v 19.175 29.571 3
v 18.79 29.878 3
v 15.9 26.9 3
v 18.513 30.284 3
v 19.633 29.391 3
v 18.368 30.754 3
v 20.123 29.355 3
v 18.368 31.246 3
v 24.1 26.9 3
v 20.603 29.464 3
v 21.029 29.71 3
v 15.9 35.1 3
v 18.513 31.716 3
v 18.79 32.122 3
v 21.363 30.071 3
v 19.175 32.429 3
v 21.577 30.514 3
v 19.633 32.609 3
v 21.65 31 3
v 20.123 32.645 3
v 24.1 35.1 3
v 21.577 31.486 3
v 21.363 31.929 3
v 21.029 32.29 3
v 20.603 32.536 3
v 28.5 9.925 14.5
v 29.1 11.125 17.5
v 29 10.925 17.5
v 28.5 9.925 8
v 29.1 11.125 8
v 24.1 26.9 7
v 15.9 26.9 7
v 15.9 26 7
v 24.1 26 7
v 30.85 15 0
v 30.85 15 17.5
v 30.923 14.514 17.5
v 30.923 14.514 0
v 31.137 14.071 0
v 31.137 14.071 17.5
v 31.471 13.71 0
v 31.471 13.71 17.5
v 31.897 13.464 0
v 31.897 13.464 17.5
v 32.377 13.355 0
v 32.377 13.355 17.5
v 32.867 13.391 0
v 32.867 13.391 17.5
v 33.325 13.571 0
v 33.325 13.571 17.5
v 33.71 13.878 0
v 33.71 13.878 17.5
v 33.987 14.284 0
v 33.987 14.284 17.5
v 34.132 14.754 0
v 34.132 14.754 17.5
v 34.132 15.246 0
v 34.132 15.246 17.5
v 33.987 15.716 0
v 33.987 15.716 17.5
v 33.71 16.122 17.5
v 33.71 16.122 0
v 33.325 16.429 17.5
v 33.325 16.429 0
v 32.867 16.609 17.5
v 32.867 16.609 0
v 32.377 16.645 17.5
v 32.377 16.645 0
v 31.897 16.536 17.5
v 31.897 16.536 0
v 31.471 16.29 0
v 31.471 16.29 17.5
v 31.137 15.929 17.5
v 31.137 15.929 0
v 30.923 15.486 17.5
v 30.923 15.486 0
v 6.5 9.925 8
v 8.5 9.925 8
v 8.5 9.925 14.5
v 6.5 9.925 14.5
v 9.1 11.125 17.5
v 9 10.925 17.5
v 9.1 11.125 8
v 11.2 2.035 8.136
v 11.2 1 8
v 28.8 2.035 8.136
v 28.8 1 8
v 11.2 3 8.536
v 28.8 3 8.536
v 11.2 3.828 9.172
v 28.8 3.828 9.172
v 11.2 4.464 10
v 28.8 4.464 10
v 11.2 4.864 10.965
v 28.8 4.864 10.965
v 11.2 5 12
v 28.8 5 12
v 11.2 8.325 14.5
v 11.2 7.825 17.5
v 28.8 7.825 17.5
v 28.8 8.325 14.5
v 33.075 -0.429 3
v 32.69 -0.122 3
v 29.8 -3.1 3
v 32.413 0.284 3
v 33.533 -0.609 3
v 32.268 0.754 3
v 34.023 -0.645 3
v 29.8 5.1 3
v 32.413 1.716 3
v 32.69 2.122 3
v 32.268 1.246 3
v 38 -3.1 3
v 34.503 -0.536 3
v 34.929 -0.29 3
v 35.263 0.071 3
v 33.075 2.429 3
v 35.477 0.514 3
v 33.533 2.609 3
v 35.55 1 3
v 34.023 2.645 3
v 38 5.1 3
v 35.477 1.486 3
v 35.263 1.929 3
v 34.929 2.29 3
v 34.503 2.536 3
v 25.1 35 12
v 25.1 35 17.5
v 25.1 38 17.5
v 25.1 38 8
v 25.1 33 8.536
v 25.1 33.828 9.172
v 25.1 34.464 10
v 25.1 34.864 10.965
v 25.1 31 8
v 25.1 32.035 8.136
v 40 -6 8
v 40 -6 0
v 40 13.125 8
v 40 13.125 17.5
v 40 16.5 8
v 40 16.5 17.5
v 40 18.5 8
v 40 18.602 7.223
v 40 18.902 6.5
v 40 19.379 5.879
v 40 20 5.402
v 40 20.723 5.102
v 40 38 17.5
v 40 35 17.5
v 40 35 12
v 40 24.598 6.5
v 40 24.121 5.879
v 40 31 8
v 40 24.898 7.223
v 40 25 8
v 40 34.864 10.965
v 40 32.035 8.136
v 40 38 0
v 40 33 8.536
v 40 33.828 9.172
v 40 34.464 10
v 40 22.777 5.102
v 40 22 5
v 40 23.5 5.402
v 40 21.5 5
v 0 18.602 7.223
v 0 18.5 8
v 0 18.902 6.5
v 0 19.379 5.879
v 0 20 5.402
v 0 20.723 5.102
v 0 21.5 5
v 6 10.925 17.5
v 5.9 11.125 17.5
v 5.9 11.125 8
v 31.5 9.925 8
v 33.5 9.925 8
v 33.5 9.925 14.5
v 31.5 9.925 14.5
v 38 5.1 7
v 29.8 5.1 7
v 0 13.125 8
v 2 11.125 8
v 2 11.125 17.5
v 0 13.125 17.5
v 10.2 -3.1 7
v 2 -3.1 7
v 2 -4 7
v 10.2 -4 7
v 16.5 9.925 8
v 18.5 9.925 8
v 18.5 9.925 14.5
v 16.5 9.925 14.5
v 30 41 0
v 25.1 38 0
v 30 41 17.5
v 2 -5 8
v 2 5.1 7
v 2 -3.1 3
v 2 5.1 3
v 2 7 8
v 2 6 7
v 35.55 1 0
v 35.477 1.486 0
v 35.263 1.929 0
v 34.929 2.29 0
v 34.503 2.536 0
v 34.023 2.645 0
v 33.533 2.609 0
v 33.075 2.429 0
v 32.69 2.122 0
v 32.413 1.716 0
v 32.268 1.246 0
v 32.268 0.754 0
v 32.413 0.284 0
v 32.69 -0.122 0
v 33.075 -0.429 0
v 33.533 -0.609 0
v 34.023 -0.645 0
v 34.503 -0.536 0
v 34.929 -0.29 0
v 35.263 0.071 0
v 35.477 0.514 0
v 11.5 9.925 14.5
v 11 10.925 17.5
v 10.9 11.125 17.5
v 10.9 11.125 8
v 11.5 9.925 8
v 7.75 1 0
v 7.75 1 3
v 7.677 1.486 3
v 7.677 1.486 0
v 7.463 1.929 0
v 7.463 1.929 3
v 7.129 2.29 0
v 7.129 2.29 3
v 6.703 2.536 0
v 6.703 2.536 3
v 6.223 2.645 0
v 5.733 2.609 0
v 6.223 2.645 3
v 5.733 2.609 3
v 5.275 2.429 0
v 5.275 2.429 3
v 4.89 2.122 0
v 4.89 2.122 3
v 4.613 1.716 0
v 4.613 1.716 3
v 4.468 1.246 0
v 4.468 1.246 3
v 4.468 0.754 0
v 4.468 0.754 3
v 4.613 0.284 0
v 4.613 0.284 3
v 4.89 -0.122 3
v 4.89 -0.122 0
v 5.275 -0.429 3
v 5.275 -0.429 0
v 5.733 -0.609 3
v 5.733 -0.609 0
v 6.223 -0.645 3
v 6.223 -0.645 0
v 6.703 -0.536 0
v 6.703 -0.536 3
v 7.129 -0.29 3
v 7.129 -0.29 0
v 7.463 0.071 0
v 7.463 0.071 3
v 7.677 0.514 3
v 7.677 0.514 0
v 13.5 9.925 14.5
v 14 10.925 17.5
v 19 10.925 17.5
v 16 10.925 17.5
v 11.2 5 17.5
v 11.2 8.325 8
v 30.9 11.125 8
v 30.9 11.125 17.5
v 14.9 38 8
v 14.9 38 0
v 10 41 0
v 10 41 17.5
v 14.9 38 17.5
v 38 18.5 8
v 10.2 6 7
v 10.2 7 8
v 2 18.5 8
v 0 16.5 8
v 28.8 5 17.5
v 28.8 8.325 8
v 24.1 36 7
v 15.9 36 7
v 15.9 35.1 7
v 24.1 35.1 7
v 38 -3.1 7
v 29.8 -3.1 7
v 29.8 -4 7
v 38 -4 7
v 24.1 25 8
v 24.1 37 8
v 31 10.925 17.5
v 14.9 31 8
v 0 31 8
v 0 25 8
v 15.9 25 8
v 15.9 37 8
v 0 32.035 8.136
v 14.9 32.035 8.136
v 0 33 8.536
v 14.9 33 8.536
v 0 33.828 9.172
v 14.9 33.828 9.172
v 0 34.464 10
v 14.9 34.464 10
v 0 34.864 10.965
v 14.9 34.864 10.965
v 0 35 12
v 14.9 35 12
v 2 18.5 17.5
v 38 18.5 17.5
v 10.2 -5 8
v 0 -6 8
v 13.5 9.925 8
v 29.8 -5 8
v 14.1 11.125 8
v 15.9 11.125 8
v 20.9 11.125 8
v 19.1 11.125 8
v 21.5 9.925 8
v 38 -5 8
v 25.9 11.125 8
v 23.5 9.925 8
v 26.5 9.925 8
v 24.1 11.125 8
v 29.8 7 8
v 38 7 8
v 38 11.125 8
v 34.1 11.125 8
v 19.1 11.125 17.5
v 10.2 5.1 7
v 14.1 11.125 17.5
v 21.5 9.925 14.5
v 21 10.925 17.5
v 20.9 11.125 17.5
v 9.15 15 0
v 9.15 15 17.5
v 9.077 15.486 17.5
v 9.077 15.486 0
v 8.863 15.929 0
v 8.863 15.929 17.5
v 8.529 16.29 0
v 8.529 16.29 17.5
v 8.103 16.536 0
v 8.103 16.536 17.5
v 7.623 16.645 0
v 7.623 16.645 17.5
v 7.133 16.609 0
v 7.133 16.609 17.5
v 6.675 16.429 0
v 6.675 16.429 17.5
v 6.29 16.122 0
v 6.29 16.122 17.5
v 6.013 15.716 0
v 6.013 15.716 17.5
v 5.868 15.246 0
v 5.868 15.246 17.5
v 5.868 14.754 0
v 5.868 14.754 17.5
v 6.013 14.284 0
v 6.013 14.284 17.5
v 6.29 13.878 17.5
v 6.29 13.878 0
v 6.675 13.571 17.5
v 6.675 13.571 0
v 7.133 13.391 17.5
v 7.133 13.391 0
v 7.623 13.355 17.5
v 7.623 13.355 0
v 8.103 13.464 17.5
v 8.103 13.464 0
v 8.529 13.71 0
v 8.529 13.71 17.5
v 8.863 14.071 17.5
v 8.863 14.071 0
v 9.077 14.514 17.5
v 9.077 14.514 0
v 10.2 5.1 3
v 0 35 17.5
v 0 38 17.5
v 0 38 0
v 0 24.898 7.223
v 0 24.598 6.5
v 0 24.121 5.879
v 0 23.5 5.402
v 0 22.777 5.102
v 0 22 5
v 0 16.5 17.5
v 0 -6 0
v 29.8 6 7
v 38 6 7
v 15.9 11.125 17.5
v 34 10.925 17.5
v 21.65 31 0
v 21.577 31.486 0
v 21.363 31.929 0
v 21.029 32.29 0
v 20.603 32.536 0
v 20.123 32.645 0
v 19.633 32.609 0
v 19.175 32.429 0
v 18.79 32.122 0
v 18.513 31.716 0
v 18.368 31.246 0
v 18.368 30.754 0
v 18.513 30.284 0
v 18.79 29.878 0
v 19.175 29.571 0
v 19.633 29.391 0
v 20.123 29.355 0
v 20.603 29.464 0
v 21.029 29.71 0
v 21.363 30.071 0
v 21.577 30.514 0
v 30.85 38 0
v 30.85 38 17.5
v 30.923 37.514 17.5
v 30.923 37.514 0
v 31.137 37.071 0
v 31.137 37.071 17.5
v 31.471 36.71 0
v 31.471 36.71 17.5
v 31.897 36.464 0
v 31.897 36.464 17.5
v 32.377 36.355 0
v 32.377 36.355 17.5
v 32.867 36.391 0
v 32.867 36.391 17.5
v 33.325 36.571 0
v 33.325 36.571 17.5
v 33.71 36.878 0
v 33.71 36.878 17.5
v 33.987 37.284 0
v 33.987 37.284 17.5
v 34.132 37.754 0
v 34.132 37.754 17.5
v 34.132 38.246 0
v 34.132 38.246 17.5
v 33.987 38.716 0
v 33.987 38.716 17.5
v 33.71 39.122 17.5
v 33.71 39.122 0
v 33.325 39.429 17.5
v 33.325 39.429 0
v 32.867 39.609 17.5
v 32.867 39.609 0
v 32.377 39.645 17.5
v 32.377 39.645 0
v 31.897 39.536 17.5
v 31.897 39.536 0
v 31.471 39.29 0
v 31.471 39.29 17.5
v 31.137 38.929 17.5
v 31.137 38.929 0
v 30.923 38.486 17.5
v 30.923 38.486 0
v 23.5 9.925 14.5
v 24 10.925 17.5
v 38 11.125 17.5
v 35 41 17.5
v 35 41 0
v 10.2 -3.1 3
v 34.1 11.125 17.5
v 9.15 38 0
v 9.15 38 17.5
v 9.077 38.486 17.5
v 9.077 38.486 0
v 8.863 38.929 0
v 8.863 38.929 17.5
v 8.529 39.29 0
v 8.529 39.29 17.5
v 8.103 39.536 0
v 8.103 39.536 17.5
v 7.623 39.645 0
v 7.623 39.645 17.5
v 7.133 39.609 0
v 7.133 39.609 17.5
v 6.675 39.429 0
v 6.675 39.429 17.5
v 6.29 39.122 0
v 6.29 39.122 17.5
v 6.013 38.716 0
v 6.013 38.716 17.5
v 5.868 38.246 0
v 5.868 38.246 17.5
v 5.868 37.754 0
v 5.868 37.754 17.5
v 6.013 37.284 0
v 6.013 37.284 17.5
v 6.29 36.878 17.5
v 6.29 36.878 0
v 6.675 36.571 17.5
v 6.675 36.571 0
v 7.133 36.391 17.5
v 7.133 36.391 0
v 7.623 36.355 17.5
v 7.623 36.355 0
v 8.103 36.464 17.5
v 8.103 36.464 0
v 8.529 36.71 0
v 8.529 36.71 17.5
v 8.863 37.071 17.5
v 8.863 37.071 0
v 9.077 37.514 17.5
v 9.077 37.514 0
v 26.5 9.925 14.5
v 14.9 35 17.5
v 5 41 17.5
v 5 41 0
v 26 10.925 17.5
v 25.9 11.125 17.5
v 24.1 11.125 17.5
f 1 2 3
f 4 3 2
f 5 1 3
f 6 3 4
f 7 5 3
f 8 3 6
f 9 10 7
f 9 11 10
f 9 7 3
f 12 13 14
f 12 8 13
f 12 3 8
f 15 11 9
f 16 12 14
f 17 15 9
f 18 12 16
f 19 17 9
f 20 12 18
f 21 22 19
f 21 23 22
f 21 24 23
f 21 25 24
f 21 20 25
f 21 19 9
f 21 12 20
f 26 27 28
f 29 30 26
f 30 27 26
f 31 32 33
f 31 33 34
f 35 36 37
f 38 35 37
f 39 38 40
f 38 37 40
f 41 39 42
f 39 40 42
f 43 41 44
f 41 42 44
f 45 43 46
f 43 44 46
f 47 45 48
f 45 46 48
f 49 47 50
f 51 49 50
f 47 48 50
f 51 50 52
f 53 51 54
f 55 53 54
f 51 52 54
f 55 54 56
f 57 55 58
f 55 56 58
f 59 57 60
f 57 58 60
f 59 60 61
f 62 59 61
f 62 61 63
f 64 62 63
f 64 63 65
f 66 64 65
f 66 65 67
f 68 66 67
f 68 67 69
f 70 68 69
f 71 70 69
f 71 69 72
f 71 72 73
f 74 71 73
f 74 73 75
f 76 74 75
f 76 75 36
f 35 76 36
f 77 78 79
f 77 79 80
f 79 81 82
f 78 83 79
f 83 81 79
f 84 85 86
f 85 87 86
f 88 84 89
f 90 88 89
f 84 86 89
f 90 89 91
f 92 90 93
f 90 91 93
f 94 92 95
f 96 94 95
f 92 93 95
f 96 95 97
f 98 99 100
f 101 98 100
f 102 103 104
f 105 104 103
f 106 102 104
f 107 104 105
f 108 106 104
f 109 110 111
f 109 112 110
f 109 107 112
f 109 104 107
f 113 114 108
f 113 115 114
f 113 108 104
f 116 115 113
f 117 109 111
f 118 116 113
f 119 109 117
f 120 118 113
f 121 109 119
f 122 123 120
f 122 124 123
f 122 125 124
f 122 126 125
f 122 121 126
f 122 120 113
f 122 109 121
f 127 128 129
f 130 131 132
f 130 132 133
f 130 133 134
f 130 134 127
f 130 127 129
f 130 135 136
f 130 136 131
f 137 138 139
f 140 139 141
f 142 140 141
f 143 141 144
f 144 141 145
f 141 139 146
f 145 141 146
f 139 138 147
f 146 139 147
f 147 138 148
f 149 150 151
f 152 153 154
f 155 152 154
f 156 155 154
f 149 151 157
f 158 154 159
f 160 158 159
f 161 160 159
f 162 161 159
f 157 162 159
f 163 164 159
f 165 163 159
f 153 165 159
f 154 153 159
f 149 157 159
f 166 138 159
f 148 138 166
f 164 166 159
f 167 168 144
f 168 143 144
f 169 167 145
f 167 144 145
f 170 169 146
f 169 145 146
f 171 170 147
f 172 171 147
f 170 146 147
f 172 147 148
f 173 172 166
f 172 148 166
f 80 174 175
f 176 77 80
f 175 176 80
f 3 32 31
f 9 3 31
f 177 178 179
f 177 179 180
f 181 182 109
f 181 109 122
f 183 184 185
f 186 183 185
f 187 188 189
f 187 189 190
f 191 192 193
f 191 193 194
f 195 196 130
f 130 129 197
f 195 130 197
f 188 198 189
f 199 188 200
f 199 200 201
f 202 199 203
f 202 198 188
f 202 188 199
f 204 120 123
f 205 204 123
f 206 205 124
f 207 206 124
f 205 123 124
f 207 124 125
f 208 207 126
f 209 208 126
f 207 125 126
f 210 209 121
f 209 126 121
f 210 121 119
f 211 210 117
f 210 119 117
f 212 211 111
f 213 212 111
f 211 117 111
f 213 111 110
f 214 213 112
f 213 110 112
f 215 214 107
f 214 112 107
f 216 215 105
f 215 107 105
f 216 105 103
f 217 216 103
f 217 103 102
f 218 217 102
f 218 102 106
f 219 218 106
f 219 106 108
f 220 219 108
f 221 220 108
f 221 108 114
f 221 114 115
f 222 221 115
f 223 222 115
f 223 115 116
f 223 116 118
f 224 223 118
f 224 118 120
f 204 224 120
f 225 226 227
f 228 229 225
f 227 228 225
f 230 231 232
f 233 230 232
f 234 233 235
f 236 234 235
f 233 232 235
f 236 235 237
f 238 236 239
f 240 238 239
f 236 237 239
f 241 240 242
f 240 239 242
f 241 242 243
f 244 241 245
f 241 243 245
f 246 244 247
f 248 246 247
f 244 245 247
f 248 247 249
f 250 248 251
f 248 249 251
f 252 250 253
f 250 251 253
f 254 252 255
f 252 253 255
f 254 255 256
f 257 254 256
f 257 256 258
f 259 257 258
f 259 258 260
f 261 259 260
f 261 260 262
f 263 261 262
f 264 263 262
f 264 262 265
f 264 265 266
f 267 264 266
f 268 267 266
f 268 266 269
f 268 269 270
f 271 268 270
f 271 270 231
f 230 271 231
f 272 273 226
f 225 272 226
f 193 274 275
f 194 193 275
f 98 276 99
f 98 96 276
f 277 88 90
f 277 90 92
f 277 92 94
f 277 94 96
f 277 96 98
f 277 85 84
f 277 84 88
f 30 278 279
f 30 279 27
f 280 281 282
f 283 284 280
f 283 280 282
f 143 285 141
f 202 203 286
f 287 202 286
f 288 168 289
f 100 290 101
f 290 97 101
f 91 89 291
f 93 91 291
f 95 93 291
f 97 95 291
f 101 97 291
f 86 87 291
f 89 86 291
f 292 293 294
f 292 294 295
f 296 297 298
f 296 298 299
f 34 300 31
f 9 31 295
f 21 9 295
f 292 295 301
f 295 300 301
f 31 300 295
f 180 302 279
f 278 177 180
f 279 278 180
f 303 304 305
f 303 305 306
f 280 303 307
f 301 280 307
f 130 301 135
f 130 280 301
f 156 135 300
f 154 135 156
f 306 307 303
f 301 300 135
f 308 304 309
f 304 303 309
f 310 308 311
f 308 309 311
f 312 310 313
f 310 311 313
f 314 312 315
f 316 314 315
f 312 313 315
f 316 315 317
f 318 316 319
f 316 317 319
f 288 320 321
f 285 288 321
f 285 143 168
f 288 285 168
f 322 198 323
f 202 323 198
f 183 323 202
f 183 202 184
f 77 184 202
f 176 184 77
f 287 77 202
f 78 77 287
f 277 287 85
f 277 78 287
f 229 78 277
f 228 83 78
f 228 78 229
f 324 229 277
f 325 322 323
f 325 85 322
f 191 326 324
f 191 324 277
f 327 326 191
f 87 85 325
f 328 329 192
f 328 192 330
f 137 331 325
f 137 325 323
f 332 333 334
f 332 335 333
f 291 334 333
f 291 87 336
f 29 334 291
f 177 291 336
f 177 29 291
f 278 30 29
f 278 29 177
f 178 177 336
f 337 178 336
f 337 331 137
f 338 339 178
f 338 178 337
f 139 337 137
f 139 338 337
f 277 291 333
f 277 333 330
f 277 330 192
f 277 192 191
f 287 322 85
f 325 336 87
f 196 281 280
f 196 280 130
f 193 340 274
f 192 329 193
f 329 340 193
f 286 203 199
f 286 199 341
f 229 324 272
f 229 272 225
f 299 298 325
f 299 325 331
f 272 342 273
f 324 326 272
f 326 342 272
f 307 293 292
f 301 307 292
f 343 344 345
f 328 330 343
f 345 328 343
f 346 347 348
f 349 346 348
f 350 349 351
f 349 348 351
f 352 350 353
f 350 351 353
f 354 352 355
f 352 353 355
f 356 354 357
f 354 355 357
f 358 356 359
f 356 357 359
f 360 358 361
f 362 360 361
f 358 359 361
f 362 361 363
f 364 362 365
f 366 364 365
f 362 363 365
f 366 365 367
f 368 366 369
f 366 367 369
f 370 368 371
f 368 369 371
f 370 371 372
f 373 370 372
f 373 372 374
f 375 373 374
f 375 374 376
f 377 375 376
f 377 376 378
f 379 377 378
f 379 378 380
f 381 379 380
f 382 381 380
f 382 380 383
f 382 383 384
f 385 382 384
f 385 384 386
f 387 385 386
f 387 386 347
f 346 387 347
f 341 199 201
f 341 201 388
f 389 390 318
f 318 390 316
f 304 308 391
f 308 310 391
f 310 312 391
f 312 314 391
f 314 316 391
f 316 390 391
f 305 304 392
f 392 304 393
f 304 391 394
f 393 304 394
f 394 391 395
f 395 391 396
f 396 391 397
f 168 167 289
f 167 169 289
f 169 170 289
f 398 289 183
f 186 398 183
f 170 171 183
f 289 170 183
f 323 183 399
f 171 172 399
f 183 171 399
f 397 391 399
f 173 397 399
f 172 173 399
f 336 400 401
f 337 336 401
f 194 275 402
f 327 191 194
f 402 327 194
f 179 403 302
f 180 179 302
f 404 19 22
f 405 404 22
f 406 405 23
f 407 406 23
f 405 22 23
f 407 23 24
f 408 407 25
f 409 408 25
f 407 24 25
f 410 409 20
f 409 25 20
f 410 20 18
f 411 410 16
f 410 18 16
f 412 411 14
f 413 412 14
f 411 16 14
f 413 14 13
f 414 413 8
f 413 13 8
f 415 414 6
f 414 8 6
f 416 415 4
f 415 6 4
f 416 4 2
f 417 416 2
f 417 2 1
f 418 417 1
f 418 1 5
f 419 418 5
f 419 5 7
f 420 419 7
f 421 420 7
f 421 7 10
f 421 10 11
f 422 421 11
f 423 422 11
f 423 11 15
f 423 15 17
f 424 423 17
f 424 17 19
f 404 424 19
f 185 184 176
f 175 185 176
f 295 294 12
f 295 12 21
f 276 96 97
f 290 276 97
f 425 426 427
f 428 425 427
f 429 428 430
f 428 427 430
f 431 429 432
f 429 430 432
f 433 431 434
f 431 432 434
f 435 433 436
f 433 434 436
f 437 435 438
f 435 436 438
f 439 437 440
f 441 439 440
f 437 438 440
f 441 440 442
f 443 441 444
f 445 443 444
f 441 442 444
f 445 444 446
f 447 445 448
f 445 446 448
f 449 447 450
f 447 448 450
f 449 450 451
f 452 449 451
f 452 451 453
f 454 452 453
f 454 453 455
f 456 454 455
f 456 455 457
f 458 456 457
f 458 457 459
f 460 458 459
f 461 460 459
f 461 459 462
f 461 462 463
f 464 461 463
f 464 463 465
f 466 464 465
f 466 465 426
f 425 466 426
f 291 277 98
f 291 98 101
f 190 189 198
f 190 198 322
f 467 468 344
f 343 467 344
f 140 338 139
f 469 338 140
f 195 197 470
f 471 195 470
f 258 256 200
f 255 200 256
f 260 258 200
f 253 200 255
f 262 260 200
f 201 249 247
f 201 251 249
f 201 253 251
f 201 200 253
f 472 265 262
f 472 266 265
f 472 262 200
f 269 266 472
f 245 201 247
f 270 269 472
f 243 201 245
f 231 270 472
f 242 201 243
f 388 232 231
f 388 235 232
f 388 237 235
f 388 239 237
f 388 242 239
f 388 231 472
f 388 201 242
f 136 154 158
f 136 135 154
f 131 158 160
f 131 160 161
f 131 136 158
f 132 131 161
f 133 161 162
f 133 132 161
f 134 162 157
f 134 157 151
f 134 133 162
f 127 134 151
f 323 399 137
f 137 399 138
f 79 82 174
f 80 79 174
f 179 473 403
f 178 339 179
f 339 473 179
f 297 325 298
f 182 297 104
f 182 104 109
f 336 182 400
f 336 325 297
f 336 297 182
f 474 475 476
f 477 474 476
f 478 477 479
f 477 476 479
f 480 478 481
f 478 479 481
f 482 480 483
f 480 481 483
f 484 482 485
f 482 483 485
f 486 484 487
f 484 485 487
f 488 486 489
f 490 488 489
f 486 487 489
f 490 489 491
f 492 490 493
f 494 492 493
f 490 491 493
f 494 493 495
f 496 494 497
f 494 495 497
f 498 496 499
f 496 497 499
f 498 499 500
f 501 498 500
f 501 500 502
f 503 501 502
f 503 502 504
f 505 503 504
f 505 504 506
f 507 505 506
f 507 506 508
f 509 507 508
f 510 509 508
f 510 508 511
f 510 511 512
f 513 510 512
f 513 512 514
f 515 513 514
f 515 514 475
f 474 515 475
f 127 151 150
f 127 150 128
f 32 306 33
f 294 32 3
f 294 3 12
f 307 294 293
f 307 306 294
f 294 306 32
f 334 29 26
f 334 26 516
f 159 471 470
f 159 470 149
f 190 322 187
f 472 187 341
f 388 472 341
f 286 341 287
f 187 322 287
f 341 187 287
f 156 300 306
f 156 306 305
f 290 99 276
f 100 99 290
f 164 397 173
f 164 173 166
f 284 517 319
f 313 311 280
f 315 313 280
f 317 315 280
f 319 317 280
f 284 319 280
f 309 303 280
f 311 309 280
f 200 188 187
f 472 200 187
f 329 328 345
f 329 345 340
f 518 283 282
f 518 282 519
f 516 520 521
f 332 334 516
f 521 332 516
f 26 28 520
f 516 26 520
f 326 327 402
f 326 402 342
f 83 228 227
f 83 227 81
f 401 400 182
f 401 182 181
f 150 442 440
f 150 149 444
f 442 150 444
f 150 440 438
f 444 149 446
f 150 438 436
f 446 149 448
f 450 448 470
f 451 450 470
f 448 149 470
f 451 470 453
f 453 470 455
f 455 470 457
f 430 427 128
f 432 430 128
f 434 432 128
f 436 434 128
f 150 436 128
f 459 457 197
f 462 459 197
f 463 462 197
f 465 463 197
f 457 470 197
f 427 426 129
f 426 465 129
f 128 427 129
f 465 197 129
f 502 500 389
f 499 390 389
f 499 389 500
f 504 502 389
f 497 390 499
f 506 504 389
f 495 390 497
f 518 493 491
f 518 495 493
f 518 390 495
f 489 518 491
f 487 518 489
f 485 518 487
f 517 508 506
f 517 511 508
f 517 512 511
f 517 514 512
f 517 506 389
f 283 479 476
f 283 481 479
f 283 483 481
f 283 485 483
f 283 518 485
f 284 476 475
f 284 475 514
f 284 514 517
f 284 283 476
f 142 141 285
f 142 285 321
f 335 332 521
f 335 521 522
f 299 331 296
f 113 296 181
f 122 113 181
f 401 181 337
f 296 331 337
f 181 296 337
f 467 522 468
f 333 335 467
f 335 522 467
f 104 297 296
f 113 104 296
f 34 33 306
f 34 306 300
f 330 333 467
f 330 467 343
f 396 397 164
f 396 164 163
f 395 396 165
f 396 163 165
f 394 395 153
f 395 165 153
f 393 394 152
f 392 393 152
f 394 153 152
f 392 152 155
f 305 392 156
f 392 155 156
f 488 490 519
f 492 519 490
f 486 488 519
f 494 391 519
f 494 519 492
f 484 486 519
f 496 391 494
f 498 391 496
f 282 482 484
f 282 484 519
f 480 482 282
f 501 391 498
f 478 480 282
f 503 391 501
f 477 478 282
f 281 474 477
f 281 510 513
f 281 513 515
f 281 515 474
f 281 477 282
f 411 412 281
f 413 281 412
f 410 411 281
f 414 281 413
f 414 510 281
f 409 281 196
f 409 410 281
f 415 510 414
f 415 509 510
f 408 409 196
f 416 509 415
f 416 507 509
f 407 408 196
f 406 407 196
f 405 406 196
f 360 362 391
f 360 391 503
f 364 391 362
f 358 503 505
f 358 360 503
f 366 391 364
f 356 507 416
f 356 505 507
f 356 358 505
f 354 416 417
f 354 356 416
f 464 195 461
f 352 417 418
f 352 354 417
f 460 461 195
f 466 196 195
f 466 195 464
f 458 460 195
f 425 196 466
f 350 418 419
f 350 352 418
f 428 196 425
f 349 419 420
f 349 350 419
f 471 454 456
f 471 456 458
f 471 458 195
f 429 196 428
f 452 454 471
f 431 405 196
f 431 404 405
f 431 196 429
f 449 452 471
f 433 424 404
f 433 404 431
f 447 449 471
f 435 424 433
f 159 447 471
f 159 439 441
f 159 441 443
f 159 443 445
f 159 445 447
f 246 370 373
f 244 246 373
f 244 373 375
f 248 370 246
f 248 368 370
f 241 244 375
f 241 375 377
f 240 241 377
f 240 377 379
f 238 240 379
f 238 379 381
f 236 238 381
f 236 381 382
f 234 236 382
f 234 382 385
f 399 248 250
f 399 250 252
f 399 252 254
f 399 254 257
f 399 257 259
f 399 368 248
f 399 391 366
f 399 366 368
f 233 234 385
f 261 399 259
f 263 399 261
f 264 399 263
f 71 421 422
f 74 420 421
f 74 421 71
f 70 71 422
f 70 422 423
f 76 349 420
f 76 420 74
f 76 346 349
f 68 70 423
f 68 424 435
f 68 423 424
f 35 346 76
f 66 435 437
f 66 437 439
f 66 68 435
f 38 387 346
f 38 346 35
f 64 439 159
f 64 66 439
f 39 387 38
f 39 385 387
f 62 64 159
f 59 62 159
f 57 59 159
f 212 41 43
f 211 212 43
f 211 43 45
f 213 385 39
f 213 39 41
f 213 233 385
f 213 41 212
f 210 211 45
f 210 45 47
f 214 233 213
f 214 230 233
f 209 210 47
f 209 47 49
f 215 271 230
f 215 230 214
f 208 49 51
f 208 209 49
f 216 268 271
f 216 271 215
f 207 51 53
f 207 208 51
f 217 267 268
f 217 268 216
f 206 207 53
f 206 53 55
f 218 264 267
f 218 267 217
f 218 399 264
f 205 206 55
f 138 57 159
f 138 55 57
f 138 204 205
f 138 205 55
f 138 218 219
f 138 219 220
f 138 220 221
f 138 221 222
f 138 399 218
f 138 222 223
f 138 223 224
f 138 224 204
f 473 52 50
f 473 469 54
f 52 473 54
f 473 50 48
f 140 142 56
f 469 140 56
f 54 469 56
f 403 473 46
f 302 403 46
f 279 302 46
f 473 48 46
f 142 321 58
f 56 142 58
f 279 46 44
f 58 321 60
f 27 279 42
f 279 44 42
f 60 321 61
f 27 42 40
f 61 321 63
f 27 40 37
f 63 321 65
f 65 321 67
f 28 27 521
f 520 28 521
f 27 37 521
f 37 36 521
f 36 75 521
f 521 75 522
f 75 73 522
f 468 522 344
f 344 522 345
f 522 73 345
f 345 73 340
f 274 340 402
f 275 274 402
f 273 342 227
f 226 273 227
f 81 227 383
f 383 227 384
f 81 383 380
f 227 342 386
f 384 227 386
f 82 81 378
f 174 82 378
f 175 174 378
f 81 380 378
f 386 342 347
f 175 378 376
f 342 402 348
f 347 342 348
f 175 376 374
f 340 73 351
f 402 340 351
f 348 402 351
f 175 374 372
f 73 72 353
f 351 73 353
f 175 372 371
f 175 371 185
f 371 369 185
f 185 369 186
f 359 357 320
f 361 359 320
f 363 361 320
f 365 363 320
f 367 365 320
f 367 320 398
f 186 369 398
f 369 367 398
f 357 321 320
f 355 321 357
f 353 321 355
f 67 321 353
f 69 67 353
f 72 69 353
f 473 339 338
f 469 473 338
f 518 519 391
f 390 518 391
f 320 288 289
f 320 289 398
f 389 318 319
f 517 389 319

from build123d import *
from OCP.BRepFilletAPI import BRepFilletAPI_MakeChamfer

# Parameters (mm, degrees)
SKETCH1_W                       = 40
SKETCH1_H                       = 44
BOSS_EXTRUDE1_DEPTH             = 8
SKETCH2_W                       = 8.2
SKETCH2_H                       = 10
CUT_EXTRUDE1_DEPTH              = 1
SKETCH3_W                       = 8.2
SKETCH3_H                       = 8.2
CUT_EXTRUDE2_DEPTH              = 4
CHAMFER1_SIZE                   = 1
SKETCH4_R                       = 1.65
CUT_EXTRUDE3_DEPTH              = 56.398555938
SKETCH5_W                       = 17.6
SKETCH5_H                       = 3.325
BOSS_EXTRUDE2_DEPTH             = 9.5
BOSS_EXTRUDE2_DIRECTION_2_REACH = 57.749
FILLET1_R                       = 4
SKETCH6_R                       = 1.65
CUT_EXTRUDE4_DEPTH              = 60.893655758
CHAMFER2_SIZE                   = 2
SKETCH7_W                       = 40
SKETCH7_H                       = 6.5
CUT_EXTRUDE5_DEPTH              = 3
FILLET2_R                       = 3
CHAMFER3_SIZE                   = 3
CHAMFER3_SIZE2                  = 1
CHAMFER4_SIZE                   = 3
CHAMFER4_SIZE2                  = 0.5


with BuildPart() as part:
    # Sketch1 → Boss-Extrude1 (new body)
    with BuildSketch(Plane.XY):
        with Locations((20, 16)):
            Rectangle(SKETCH1_W, SKETCH1_H)
    extrude(amount=BOSS_EXTRUDE1_DEPTH)

    # Sketch2 → Cut-Extrude1 (cut)
    with BuildSketch(Plane.XY.offset(8)):
        with Locations((20, 31)):
            Rectangle(SKETCH2_W, SKETCH2_H)
        with Locations((6.1, 1)):
            Rectangle(SKETCH2_W, SKETCH2_H)
        with Locations((33.9, 1)):
            Rectangle(SKETCH2_W, SKETCH2_H)
    extrude(amount=-CUT_EXTRUDE1_DEPTH, mode=Mode.SUBTRACT)

    # Sketch3 → Cut-Extrude2 (cut)
    with BuildSketch(Plane.XY.offset(7)):
        with Locations((20, 31)):
            Rectangle(SKETCH3_W, SKETCH3_H)
        with Locations((6.1, 1)):
            Rectangle(SKETCH3_W, SKETCH3_H)
        with Locations((33.9, 1)):
            Rectangle(SKETCH3_W, SKETCH3_H)
    extrude(amount=-CUT_EXTRUDE2_DEPTH, mode=Mode.SUBTRACT)

    # Chamfer1
    chamfer1_edges = [part.edges().sort_by_distance(p)[0] for p in [
        (20, 26, 8),
        (20, 36, 8),
        (33.9, -4, 8),
        (33.9, 6, 8),
        (6.1, -4, 8),
        (6.1, 6, 8),
    ]]
    chamfer(chamfer1_edges, length=CHAMFER1_SIZE - 0.0001)  # a hair under: the kernel refuses the full size

    # Sketch4 → Cut-Extrude3 (cut, through all)
    with BuildSketch(Plane.XY.offset(3)):
        with Locations((20, 31)):
            Circle(SKETCH4_R)
        with Locations((6.1, 1)):
            Circle(SKETCH4_R)
        with Locations((33.9, 1)):
            Circle(SKETCH4_R)
    extrude(amount=-CUT_EXTRUDE3_DEPTH, mode=Mode.SUBTRACT)

    # Sketch5 → Boss-Extrude2 (add)
    with BuildSketch(Plane.XY.offset(8)):
        Polygon((20.9, 11.125), (19.1, 11.125), (18.5, 9.925), (16.5, 9.925), (15.9, 11.125), (14.1, 11.125), (13.5, 9.925), (11.5, 9.925), (10.9, 11.125), (9.1, 11.125), (8.5, 9.925), (6.5, 9.925), (5.9, 11.125), (4.1, 11.125), (0, 11.125), (0, 18.5), (40, 18.5), (40, 11.125), (35.9, 11.125), (34.1, 11.125), (33.5, 9.925), (31.5, 9.925), (30.9, 11.125), (29.1, 11.125), (28.5, 9.925), (26.5, 9.925), (25.9, 11.125), (24.1, 11.125), (23.5, 9.925), (21.5, 9.925), align=None)
        with Locations((20, 6.6625)):
            Rectangle(SKETCH5_W, SKETCH5_H)
        Polygon((0, 35), (14.9, 35), (14.9, 38), (10, 41), (5, 41), (0, 38), align=None)
        Polygon((25.1, 38), (30, 41), (35, 41), (40, 38), (40, 35), (25.1, 35), align=None)
    extrude(amount=BOSS_EXTRUDE2_DEPTH)

    # Boss-Extrude2 direction 2: up to this face of the body (flat: up to its plane)
    boss_extrude2_direction_2_end = Plane(part.part.faces().sort_by_distance((20, 16.073973219, 0))[0])
    # Sketch5 → Boss-Extrude2 direction 2 (add, up to the picked face)
    with BuildSketch(Plane.XY.offset(8), mode=Mode.PRIVATE) as boss_extrude2_direction_2_sk1:
        Polygon((20.9, 11.125), (19.1, 11.125), (18.5, 9.925), (16.5, 9.925), (15.9, 11.125), (14.1, 11.125), (13.5, 9.925), (11.5, 9.925), (10.9, 11.125), (9.1, 11.125), (8.5, 9.925), (6.5, 9.925), (5.9, 11.125), (4.1, 11.125), (0, 11.125), (0, 18.5), (40, 18.5), (40, 11.125), (35.9, 11.125), (34.1, 11.125), (33.5, 9.925), (31.5, 9.925), (30.9, 11.125), (29.1, 11.125), (28.5, 9.925), (26.5, 9.925), (25.9, 11.125), (24.1, 11.125), (23.5, 9.925), (21.5, 9.925), align=None)
    boss_extrude2_direction_2_tool1 = split(extrude(boss_extrude2_direction_2_sk1.sketch, amount=-BOSS_EXTRUDE2_DIRECTION_2_REACH, mode=Mode.PRIVATE), bisect_by=boss_extrude2_direction_2_end, keep=Keep.BOTH, mode=Mode.PRIVATE)
    # Sketch5 → Boss-Extrude2 direction 2 (add, up to the picked face)
    with BuildSketch(Plane.XY.offset(8), mode=Mode.PRIVATE) as boss_extrude2_direction_2_sk2:
        with Locations((20, 6.6625)):
            Rectangle(SKETCH5_W, SKETCH5_H)
    boss_extrude2_direction_2_tool2 = split(extrude(boss_extrude2_direction_2_sk2.sketch, amount=-BOSS_EXTRUDE2_DIRECTION_2_REACH, mode=Mode.PRIVATE), bisect_by=boss_extrude2_direction_2_end, keep=Keep.BOTH, mode=Mode.PRIVATE)
    # Sketch5 → Boss-Extrude2 direction 2 (add, up to the picked face)
    with BuildSketch(Plane.XY.offset(8), mode=Mode.PRIVATE) as boss_extrude2_direction_2_sk3:
        Polygon((0, 35), (14.9, 35), (14.9, 38), (10, 41), (5, 41), (0, 38), align=None)
    boss_extrude2_direction_2_tool3 = split(extrude(boss_extrude2_direction_2_sk3.sketch, amount=-BOSS_EXTRUDE2_DIRECTION_2_REACH, mode=Mode.PRIVATE), bisect_by=boss_extrude2_direction_2_end, keep=Keep.BOTH, mode=Mode.PRIVATE)
    # Sketch5 → Boss-Extrude2 direction 2 (add, up to the picked face)
    with BuildSketch(Plane.XY.offset(8), mode=Mode.PRIVATE) as boss_extrude2_direction_2_sk4:
        Polygon((25.1, 38), (30, 41), (35, 41), (40, 38), (40, 35), (25.1, 35), align=None)
    boss_extrude2_direction_2_tool4 = split(extrude(boss_extrude2_direction_2_sk4.sketch, amount=-BOSS_EXTRUDE2_DIRECTION_2_REACH, mode=Mode.PRIVATE), bisect_by=boss_extrude2_direction_2_end, keep=Keep.BOTH, mode=Mode.PRIVATE)
    add(boss_extrude2_direction_2_tool1.solids().sort_by(Axis((20, 14.559414, 8), (0, 0, -1)))[0])
    add(boss_extrude2_direction_2_tool2.solids().sort_by(Axis((20, 6.6625, 8), (0, 0, -1)))[0])
    add(boss_extrude2_direction_2_tool3.solids().sort_by(Axis((7.45835, 37.60161, 8), (0, 0, -1)))[0])
    add(boss_extrude2_direction_2_tool4.solids().sort_by(Axis((32.54165, 37.60161, 8), (0, 0, -1)))[0])

    # Fillet1
    fillet1_edges = [part.edges().sort_by_distance(p)[0] for p in [
        (20, 5, 8),
        (7.45, 35, 8),
        (32.55, 35, 8),
    ]]
    fillet(fillet1_edges, radius=FILLET1_R)

    # Sketch6 → Cut-Extrude4 (cut, through all)
    with BuildSketch(Plane.XY.offset(17.5)):
        with Locations((7.5, 38)):
            Circle(SKETCH6_R)
        with Locations((7.5, 15)):
            Circle(SKETCH6_R)
        with Locations(Location((32.5, 38, 0), (0, 0, 180))):
            Circle(SKETCH6_R)
        with Locations(Location((32.5, 15, 0), (0, 0, 180))):
            Circle(SKETCH6_R)
    extrude(amount=-CUT_EXTRUDE4_DEPTH, mode=Mode.SUBTRACT)

    # Chamfer2
    chamfer2_edges = [part.edges().sort_by_distance(p)[0] for p in [
        (0, 11.125, 12.75),
        (0, 18.5, 12.75),
        (40, 18.5, 12.75),
        (40, 11.125, 12.75),
    ]]
    chamfer(chamfer2_edges, length=CHAMFER2_SIZE)

    # Sketch7 → Cut-Extrude5 (cut)
    with BuildSketch(Plane.XY.offset(8)):
        with Locations((20, 21.75)):
            Rectangle(SKETCH7_W, SKETCH7_H)
    extrude(amount=-CUT_EXTRUDE5_DEPTH, mode=Mode.SUBTRACT)

    # Fillet2
    fillet2_edges = [part.edges().sort_by_distance(p)[0] for p in [
        (20, 18.5, 5),
        (20, 25, 5),
    ]]
    fillet(fillet2_edges, radius=FILLET2_R - 0.0001)  # a hair under: the kernel refuses the full size

    # Chamfer3: one chamfer whose edges measure the first distance from different faces: ONE call of the kernel's chamfer builder (chamfer() names one face for all edges)
    chamfer3_edges_1 = [part.edges().sort_by_distance(p)[0] for p in [
        (22.5, 9.925, 17.5),
    ]]
    chamfer3_side_1 = [part.faces().sort_by_distance(p)[0] for p in [
        (22.5, 9.925, 12.75),
    ]]
    chamfer3_edges_2 = [part.edges().sort_by_distance(p)[0] for p in [
        (27.5, 9.925, 17.5),
    ]]
    chamfer3_side_2 = [part.faces().sort_by_distance(p)[0] for p in [
        (27.5, 9.925, 12.75),
    ]]
    chamfer3_edges_3 = [part.edges().sort_by_distance(p)[0] for p in [
        (32.5, 9.925, 17.5),
    ]]
    chamfer3_side_3 = [part.faces().sort_by_distance(p)[0] for p in [
        (32.5, 9.925, 12.75),
    ]]
    chamfer3_edges_4 = [part.edges().sort_by_distance(p)[0] for p in [
        (7.5, 9.925, 17.5),
    ]]
    chamfer3_side_4 = [part.faces().sort_by_distance(p)[0] for p in [
        (7.5, 9.925, 12.75),
    ]]
    chamfer3_edges_5 = [part.edges().sort_by_distance(p)[0] for p in [
        (12.5, 9.925, 17.5),
    ]]
    chamfer3_side_5 = [part.faces().sort_by_distance(p)[0] for p in [
        (12.5, 9.925, 12.75),
    ]]
    chamfer3_edges_6 = [part.edges().sort_by_distance(p)[0] for p in [
        (17.5, 9.925, 17.5),
    ]]
    chamfer3_side_6 = [part.faces().sort_by_distance(p)[0] for p in [
        (17.5, 9.925, 12.75),
    ]]
    chamfer3 = BRepFilletAPI_MakeChamfer(part.part.solid().wrapped)
    for e in chamfer3_edges_1:
        chamfer3.Add(CHAMFER3_SIZE, CHAMFER3_SIZE2, e.wrapped, chamfer3_side_1[0].wrapped)  # the first distance lies on this face
    for e in chamfer3_edges_2:
        chamfer3.Add(CHAMFER3_SIZE, CHAMFER3_SIZE2, e.wrapped, chamfer3_side_2[0].wrapped)  # the first distance lies on this face
    for e in chamfer3_edges_3:
        chamfer3.Add(CHAMFER3_SIZE, CHAMFER3_SIZE2, e.wrapped, chamfer3_side_3[0].wrapped)  # the first distance lies on this face
    for e in chamfer3_edges_4:
        chamfer3.Add(CHAMFER3_SIZE, CHAMFER3_SIZE2, e.wrapped, chamfer3_side_4[0].wrapped)  # the first distance lies on this face
    for e in chamfer3_edges_5:
        chamfer3.Add(CHAMFER3_SIZE, CHAMFER3_SIZE2, e.wrapped, chamfer3_side_5[0].wrapped)  # the first distance lies on this face
    for e in chamfer3_edges_6:
        chamfer3.Add(CHAMFER3_SIZE, CHAMFER3_SIZE2, e.wrapped, chamfer3_side_6[0].wrapped)  # the first distance lies on this face
    add(Compound.cast(chamfer3.Shape()), mode=Mode.REPLACE)

    # Chamfer4
    chamfer4_edges = [part.edges().sort_by_distance(p)[0] for p in [
        (20, 8.325, 17.5),
    ]]
    chamfer4_side = [part.faces().sort_by_distance(p)[0] for p in [
        (20, 8.325, 12.75),
    ]]
    chamfer(chamfer4_edges, length=CHAMFER4_SIZE, length2=CHAMFER4_SIZE2, reference=chamfer4_side[0])


solid = part.part
